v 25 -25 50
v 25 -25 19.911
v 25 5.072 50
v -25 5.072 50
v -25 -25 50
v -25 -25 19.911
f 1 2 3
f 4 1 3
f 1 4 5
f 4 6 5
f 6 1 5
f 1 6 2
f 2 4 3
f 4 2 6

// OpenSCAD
//This is a simple test to make slashed STL files.
//Limitations of openscad are things like centering STLs... just... ew.


//command line calling:
// openscad -o cube/cube1.stl -D part="cube" slasher_test.scad &


//Slash variables
slash_length = 30; //this is how thick the slashes are - i.e. how far the print bed advances between prints.
slash_angle = 45; //measured from the bed - how slanty the slices are
slash_width = 180; //size of the printer, basically
slash_height = slash_width;

//Command Line Execution bits
part = "cube";
slash = -2;  //note that due to the eccentricities of OpenSCAD, 0 is the center.  You can grab slices in front or behind, and just go to town from there

if(part == "cube"){
    intersection(){
        translate([0,0,25]) cube(50, center=true);
    
        make_slash(slash, slash_angle, slash_length);
        
    }
}

if(part == "benchy"){
    intersection(){
        translate([-90,-90,-24]) import("/Users/paenian/github/PrintSlasher/test STLs/3dbenchy.stl");
    
        make_slash(slash, slash_angle, slash_length);
        
    }
}

if(part == "shark"){
    intersection(){
        translate([-210,-90,-24]) import("/Users/paenian/github/PrintSlasher/test STLs/ArticulatedHammerheadShark.stl");
        
        make_slash(slash, slash_angle, slash_length);
    }
}



//this makes a single slice centered on the origin, or offset by the slice number
module make_slash(num = slash, angle = slash_angle, length = slash_length, width=slash_width, height=slash_height)
{
    translate([0,num*length,0])
    difference(){
        union(){
            hull(){
                translate([0,0,-.05]) cube([width, length, .1], center=true);
                translate([0,tan(angle)*height,height+.05]) cube([width, length, .1], center=true);
                echo(tan(angle));
            }
        }
    }
}
